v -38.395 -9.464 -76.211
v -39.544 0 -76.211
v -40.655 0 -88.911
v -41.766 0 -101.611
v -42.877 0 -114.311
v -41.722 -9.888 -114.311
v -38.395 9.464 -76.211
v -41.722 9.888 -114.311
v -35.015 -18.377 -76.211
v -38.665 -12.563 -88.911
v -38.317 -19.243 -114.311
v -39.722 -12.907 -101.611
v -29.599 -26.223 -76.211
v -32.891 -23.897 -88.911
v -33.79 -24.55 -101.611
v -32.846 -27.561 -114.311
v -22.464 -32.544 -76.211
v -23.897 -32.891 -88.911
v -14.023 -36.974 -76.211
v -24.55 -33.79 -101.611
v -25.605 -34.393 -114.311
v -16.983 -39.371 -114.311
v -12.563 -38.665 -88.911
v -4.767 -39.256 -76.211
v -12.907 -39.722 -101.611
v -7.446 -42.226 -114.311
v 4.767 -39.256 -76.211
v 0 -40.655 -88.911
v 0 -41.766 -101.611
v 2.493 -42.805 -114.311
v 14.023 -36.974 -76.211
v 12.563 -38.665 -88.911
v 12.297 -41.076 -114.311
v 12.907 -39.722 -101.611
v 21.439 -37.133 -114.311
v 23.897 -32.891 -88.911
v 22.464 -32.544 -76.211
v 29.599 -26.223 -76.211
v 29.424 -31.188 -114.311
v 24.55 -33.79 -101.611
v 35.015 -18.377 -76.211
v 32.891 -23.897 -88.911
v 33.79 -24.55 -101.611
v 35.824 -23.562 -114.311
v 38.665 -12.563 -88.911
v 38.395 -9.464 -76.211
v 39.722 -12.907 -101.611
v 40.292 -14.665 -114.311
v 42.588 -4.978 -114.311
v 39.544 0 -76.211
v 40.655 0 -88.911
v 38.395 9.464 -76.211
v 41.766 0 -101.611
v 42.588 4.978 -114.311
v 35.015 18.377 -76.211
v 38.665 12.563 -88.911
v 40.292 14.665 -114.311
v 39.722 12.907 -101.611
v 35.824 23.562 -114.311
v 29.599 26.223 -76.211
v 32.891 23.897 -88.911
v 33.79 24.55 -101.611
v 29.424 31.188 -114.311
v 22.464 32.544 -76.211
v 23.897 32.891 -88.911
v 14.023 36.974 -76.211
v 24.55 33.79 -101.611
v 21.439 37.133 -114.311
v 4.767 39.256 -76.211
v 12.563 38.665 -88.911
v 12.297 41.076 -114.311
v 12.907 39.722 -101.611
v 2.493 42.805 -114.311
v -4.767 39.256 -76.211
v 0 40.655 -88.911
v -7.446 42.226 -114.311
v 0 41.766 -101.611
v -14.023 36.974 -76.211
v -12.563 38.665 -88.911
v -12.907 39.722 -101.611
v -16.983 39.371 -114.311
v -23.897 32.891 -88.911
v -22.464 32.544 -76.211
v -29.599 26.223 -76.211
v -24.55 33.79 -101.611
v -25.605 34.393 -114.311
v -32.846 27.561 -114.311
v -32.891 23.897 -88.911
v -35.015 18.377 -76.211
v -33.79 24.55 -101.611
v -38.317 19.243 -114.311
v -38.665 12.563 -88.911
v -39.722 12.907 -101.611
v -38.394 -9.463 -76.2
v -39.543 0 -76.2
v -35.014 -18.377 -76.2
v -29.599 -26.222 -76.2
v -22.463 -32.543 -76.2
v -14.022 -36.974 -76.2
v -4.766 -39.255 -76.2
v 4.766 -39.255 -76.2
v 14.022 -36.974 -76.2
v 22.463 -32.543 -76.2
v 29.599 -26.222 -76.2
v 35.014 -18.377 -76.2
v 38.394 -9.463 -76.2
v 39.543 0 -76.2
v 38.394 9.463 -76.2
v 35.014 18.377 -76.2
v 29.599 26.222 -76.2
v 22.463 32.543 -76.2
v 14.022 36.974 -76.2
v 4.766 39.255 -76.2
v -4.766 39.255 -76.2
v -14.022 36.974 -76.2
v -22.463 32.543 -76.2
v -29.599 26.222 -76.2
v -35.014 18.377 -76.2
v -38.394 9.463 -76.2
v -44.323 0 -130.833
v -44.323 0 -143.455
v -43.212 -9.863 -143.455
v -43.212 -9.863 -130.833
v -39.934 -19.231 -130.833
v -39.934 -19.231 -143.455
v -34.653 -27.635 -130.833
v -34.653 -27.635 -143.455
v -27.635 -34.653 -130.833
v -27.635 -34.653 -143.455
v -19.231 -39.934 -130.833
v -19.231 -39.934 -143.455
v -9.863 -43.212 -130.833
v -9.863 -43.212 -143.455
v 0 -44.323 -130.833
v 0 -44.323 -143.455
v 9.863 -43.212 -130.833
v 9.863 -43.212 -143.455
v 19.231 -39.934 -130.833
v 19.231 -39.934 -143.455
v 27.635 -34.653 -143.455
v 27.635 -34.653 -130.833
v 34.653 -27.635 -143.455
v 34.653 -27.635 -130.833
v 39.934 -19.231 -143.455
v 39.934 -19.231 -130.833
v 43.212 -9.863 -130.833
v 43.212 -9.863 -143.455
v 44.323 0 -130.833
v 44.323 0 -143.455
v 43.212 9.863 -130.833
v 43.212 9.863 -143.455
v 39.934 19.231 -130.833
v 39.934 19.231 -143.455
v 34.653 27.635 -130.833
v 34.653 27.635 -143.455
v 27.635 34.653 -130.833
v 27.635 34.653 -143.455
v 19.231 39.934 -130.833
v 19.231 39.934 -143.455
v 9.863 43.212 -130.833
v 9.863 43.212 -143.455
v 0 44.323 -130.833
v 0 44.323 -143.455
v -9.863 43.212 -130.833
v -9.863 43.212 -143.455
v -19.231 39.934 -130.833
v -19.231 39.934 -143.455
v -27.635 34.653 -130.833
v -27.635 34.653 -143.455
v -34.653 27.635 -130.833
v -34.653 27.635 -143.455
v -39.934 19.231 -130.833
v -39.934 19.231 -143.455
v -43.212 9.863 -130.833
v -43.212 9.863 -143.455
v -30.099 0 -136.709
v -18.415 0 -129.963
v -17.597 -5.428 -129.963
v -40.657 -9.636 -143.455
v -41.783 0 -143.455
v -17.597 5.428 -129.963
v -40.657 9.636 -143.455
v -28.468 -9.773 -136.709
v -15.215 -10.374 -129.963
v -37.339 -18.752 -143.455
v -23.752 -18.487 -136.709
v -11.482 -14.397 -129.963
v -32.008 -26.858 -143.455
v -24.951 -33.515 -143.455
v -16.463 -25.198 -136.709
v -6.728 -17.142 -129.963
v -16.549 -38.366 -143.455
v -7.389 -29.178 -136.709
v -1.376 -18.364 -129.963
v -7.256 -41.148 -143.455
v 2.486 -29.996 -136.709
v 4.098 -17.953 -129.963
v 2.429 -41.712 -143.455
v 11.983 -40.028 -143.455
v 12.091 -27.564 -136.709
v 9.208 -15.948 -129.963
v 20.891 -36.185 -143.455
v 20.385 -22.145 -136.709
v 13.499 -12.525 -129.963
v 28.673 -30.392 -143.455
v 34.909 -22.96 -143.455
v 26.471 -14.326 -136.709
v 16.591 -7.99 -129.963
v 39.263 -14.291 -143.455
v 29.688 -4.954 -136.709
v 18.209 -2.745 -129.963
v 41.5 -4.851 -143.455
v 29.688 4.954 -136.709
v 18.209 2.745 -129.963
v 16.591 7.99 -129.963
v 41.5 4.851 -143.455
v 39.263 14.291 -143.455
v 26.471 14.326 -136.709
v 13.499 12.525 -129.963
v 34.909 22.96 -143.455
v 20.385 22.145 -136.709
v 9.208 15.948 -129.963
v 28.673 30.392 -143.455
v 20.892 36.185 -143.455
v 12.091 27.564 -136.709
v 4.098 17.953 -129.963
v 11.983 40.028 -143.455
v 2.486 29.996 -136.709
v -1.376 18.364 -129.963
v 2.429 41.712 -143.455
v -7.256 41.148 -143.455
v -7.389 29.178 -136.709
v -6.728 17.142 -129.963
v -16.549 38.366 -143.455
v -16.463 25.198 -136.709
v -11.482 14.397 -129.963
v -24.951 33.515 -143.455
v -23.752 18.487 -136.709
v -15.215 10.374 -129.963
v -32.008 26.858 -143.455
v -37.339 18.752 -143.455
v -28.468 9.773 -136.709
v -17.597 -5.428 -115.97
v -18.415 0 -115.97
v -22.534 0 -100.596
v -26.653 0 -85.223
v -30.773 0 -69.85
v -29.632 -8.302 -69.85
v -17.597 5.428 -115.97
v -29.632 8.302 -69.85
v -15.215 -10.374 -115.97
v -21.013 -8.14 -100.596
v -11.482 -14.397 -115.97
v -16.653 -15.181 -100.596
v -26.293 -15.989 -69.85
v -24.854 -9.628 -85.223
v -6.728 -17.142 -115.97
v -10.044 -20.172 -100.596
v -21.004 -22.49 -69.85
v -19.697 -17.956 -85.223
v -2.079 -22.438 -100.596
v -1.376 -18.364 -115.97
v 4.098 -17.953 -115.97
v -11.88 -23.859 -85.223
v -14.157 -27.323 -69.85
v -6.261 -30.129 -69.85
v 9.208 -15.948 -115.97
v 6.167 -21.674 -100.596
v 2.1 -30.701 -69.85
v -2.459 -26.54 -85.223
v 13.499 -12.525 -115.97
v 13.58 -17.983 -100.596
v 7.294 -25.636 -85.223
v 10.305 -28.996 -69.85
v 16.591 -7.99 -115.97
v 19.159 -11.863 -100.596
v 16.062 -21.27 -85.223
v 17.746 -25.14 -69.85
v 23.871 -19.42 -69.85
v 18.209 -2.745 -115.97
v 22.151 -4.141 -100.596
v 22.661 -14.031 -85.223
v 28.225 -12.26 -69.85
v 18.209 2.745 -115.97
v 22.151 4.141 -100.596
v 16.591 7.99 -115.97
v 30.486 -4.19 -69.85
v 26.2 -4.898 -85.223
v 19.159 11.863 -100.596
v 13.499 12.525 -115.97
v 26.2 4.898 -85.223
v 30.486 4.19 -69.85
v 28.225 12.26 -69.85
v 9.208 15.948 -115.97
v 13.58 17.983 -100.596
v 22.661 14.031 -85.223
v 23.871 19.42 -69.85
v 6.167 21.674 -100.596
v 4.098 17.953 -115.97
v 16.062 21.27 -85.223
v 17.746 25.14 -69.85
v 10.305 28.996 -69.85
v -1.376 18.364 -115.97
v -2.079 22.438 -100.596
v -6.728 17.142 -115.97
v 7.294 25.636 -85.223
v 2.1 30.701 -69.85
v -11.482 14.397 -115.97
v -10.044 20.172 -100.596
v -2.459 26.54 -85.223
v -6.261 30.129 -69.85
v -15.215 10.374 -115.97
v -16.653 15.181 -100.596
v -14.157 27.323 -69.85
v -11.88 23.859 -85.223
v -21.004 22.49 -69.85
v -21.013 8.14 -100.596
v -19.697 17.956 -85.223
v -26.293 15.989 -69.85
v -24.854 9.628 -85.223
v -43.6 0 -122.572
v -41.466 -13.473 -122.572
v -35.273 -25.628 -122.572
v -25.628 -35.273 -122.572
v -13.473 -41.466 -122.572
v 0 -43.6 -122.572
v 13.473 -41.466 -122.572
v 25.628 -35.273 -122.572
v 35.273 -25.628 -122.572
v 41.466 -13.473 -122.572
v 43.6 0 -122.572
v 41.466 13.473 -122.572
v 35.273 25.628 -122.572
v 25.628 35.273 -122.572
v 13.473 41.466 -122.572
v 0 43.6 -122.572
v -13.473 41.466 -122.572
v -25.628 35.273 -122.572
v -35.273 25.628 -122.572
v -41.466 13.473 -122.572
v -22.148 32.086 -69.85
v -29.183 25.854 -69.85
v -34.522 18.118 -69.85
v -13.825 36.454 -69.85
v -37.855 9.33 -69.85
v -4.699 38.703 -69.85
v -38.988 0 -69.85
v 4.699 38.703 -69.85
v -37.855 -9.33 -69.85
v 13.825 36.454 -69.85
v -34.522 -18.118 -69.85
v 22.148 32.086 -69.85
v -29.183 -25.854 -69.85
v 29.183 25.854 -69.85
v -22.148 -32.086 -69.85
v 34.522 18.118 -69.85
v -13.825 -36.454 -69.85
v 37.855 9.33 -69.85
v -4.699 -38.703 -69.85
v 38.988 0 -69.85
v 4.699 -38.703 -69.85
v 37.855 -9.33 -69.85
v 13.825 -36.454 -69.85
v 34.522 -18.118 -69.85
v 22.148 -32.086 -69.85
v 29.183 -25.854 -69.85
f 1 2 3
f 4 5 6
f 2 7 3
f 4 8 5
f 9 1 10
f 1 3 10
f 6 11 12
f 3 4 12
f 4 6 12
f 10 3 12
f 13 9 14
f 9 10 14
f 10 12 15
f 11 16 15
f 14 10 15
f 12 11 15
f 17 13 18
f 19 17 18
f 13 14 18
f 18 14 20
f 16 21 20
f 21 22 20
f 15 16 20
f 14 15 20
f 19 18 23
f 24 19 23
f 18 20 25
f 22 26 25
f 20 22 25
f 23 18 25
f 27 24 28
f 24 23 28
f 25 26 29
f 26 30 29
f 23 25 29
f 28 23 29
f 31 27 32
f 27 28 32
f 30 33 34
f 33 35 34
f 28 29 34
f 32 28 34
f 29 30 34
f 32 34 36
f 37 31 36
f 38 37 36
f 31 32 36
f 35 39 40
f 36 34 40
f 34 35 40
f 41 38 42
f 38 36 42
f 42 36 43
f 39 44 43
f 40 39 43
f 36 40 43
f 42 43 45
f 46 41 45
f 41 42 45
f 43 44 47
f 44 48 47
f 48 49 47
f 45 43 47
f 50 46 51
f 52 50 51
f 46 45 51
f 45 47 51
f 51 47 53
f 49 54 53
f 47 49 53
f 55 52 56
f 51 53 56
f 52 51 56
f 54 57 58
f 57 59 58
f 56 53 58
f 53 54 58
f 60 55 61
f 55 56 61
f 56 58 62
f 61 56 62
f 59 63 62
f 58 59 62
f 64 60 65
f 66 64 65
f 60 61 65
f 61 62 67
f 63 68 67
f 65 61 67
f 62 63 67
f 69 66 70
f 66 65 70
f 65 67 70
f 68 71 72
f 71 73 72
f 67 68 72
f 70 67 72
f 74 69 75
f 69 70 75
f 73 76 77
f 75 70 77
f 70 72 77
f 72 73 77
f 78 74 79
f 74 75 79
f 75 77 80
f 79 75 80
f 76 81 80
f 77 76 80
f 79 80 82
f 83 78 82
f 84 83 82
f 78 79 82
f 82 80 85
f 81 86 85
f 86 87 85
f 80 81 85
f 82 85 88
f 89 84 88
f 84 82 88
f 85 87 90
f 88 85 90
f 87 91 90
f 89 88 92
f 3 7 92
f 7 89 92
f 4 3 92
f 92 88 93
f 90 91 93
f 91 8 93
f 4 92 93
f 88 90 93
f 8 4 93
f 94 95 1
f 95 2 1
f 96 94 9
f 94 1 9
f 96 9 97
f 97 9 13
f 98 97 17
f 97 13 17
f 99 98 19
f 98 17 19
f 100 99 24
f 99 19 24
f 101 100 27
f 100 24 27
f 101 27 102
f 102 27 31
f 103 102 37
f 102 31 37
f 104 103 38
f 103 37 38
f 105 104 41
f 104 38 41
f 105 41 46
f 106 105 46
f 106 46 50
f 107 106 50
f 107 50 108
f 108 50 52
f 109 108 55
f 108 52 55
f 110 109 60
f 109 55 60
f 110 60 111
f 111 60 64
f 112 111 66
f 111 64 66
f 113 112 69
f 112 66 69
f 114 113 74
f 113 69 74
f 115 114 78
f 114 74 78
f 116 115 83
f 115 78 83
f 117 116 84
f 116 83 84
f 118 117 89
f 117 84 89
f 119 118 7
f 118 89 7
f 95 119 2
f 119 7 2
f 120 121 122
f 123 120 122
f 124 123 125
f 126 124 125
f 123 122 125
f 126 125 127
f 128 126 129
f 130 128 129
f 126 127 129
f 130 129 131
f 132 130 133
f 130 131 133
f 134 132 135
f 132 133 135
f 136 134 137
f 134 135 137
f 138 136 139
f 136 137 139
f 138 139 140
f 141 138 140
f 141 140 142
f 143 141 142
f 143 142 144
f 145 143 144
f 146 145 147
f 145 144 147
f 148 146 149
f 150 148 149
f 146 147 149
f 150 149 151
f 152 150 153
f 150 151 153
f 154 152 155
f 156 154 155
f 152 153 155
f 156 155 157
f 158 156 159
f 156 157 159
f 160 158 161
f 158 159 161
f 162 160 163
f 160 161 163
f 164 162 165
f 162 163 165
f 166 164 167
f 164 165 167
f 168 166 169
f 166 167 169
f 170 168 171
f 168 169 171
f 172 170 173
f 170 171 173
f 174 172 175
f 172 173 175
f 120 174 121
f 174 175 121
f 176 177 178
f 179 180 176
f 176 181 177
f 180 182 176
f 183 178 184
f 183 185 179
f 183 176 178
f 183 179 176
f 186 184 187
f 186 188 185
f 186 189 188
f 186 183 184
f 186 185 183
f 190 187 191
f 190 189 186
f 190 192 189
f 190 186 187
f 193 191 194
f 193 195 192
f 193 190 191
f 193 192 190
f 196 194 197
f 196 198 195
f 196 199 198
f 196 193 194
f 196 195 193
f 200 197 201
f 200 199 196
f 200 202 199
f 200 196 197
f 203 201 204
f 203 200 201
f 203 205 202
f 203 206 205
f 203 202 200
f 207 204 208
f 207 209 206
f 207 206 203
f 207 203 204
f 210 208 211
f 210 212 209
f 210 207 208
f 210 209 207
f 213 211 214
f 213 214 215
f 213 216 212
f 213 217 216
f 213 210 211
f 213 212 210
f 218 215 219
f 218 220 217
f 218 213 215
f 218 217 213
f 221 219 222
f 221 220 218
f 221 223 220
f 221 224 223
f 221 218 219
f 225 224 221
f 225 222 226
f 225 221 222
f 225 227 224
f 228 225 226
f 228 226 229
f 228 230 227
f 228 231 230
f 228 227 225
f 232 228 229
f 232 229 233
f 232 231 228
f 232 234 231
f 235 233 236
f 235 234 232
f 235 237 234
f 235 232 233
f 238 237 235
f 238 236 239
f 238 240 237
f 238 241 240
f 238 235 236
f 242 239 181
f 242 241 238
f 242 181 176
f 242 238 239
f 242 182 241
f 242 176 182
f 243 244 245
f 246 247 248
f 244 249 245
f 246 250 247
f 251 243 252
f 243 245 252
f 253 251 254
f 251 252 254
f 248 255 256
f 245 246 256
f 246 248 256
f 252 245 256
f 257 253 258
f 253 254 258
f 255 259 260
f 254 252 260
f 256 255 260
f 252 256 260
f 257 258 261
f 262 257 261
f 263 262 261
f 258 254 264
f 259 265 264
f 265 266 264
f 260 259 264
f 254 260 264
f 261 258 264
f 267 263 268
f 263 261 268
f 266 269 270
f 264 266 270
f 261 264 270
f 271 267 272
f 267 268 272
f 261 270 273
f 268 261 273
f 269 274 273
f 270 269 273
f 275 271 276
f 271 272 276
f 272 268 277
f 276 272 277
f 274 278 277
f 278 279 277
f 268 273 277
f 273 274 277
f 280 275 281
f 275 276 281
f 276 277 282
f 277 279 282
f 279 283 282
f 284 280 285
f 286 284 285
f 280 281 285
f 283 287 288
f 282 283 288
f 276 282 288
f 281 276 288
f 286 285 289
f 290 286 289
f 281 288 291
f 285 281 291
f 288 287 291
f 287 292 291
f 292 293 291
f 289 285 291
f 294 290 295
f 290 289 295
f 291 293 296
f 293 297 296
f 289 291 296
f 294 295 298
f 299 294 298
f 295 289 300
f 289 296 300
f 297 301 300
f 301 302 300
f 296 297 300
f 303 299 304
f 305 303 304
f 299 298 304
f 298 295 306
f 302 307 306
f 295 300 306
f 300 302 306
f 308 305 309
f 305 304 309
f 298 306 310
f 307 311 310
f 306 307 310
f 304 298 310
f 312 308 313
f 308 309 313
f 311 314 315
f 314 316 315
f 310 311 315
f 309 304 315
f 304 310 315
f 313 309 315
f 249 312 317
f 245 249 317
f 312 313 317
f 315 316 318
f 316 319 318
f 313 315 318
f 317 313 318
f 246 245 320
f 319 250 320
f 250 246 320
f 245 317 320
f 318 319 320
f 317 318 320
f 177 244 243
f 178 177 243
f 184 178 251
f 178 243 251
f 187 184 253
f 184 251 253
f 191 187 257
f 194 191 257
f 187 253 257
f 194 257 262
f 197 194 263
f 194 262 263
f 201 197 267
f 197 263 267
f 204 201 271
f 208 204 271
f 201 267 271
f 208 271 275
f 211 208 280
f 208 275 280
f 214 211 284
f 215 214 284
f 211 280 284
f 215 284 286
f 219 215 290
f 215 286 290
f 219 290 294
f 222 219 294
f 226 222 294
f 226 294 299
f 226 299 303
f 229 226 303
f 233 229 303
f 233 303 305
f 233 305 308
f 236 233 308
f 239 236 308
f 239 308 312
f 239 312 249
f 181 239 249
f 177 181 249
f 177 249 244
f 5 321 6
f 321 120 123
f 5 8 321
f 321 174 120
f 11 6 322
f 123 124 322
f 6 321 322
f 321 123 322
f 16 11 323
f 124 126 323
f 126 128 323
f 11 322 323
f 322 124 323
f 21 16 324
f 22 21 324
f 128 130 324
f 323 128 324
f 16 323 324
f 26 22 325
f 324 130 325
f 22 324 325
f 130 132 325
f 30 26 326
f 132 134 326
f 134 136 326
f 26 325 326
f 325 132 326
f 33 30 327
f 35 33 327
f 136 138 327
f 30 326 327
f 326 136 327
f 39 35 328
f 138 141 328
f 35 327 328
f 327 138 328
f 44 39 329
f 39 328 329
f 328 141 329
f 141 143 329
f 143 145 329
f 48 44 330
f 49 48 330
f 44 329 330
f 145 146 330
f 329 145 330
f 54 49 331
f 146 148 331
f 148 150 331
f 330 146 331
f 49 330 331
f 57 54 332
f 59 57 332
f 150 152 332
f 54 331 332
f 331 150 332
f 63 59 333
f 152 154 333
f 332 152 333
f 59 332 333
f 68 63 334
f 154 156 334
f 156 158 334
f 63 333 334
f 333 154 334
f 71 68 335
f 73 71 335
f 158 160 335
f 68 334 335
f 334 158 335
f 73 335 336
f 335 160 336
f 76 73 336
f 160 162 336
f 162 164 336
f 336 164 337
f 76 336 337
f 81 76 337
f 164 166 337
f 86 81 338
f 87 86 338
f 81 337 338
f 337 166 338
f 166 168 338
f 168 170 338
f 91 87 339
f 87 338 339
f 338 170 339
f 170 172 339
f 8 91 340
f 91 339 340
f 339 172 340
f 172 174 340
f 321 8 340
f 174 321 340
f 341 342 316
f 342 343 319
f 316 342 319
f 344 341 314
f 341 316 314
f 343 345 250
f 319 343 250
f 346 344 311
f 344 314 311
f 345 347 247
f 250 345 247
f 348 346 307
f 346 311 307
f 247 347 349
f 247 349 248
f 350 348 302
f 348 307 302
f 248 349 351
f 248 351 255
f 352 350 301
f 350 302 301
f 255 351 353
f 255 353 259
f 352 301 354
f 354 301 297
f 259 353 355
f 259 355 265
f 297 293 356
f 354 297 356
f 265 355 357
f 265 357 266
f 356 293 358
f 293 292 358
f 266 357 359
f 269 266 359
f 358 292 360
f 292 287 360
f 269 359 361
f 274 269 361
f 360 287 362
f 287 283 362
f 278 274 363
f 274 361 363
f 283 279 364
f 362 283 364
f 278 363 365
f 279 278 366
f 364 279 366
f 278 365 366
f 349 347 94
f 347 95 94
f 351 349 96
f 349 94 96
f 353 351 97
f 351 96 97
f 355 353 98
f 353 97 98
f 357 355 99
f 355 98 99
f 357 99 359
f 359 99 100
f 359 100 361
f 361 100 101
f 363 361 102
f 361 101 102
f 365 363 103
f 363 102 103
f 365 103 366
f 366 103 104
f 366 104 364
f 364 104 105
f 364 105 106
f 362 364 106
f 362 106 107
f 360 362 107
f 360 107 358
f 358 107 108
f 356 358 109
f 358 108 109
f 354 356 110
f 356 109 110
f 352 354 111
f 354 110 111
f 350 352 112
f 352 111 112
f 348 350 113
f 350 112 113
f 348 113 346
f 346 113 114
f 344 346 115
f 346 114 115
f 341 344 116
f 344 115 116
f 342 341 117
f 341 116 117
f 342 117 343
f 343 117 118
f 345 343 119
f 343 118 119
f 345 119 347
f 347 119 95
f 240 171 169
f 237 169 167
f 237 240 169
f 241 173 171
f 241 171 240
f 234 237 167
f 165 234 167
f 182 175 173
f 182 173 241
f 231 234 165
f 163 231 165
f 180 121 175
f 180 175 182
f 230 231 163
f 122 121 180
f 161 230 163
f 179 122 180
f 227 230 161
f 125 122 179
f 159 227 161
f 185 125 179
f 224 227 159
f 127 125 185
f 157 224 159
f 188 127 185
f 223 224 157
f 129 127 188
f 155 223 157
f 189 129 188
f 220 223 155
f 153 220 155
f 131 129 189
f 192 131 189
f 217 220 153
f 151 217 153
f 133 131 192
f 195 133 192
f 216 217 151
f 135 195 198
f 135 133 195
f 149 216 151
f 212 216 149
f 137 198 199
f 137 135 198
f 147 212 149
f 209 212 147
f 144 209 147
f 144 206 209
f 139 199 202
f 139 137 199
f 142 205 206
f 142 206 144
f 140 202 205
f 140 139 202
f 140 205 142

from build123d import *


with BuildPart() as part:
    # Sketch1 → Revolve1 (revolve)
    with BuildSketch(Plane(origin=(0, 0, 0), x_dir=(1, 0, 0), z_dir=(0, 1, 0)), mode=Mode.PRIVATE) as revolve1_sk:
        Polygon((44.323, 130.833403353), (44.323, 143.454534929), (18.415, 128.496544155), (18.415, 120.876544155), (32.087521299, 69.85), (38.987643543, 69.85), (39.543196557, 76.2), (39.544164949, 76.211068779), (42.87748303, 114.311068779), align=None)
    revolve(revolve1_sk.sketch.rotate(Axis((0, 0, -146.817261676), (0, 0, 1)), 180), axis=Axis((0, 0, -146.817261676), (0, 0, 1)))

    # Sketch2 → Revolve2 (revolve)
    with BuildSketch(Plane(origin=(0, 0, 0), x_dir=(1, 0, 0), z_dir=(0, 1, 0)), mode=Mode.PRIVATE) as revolve2_sk:
        Polygon((18.415, 120.876544155), (18.415, 115.969640957), (30.77272055, 69.85), (32.087521299, 69.85), align=None)
        Polygon((18.415, 129.963013839), (41.783, 143.454534929), (44.323, 143.454534929), (18.415, 128.496544155), align=None)
    revolve(revolve2_sk.sketch.rotate(Axis((0, 0, -146.817261676), (0, 0, 1)), 180), axis=Axis((0, 0, -146.817261676), (0, 0, 1)))


solid = part.part
